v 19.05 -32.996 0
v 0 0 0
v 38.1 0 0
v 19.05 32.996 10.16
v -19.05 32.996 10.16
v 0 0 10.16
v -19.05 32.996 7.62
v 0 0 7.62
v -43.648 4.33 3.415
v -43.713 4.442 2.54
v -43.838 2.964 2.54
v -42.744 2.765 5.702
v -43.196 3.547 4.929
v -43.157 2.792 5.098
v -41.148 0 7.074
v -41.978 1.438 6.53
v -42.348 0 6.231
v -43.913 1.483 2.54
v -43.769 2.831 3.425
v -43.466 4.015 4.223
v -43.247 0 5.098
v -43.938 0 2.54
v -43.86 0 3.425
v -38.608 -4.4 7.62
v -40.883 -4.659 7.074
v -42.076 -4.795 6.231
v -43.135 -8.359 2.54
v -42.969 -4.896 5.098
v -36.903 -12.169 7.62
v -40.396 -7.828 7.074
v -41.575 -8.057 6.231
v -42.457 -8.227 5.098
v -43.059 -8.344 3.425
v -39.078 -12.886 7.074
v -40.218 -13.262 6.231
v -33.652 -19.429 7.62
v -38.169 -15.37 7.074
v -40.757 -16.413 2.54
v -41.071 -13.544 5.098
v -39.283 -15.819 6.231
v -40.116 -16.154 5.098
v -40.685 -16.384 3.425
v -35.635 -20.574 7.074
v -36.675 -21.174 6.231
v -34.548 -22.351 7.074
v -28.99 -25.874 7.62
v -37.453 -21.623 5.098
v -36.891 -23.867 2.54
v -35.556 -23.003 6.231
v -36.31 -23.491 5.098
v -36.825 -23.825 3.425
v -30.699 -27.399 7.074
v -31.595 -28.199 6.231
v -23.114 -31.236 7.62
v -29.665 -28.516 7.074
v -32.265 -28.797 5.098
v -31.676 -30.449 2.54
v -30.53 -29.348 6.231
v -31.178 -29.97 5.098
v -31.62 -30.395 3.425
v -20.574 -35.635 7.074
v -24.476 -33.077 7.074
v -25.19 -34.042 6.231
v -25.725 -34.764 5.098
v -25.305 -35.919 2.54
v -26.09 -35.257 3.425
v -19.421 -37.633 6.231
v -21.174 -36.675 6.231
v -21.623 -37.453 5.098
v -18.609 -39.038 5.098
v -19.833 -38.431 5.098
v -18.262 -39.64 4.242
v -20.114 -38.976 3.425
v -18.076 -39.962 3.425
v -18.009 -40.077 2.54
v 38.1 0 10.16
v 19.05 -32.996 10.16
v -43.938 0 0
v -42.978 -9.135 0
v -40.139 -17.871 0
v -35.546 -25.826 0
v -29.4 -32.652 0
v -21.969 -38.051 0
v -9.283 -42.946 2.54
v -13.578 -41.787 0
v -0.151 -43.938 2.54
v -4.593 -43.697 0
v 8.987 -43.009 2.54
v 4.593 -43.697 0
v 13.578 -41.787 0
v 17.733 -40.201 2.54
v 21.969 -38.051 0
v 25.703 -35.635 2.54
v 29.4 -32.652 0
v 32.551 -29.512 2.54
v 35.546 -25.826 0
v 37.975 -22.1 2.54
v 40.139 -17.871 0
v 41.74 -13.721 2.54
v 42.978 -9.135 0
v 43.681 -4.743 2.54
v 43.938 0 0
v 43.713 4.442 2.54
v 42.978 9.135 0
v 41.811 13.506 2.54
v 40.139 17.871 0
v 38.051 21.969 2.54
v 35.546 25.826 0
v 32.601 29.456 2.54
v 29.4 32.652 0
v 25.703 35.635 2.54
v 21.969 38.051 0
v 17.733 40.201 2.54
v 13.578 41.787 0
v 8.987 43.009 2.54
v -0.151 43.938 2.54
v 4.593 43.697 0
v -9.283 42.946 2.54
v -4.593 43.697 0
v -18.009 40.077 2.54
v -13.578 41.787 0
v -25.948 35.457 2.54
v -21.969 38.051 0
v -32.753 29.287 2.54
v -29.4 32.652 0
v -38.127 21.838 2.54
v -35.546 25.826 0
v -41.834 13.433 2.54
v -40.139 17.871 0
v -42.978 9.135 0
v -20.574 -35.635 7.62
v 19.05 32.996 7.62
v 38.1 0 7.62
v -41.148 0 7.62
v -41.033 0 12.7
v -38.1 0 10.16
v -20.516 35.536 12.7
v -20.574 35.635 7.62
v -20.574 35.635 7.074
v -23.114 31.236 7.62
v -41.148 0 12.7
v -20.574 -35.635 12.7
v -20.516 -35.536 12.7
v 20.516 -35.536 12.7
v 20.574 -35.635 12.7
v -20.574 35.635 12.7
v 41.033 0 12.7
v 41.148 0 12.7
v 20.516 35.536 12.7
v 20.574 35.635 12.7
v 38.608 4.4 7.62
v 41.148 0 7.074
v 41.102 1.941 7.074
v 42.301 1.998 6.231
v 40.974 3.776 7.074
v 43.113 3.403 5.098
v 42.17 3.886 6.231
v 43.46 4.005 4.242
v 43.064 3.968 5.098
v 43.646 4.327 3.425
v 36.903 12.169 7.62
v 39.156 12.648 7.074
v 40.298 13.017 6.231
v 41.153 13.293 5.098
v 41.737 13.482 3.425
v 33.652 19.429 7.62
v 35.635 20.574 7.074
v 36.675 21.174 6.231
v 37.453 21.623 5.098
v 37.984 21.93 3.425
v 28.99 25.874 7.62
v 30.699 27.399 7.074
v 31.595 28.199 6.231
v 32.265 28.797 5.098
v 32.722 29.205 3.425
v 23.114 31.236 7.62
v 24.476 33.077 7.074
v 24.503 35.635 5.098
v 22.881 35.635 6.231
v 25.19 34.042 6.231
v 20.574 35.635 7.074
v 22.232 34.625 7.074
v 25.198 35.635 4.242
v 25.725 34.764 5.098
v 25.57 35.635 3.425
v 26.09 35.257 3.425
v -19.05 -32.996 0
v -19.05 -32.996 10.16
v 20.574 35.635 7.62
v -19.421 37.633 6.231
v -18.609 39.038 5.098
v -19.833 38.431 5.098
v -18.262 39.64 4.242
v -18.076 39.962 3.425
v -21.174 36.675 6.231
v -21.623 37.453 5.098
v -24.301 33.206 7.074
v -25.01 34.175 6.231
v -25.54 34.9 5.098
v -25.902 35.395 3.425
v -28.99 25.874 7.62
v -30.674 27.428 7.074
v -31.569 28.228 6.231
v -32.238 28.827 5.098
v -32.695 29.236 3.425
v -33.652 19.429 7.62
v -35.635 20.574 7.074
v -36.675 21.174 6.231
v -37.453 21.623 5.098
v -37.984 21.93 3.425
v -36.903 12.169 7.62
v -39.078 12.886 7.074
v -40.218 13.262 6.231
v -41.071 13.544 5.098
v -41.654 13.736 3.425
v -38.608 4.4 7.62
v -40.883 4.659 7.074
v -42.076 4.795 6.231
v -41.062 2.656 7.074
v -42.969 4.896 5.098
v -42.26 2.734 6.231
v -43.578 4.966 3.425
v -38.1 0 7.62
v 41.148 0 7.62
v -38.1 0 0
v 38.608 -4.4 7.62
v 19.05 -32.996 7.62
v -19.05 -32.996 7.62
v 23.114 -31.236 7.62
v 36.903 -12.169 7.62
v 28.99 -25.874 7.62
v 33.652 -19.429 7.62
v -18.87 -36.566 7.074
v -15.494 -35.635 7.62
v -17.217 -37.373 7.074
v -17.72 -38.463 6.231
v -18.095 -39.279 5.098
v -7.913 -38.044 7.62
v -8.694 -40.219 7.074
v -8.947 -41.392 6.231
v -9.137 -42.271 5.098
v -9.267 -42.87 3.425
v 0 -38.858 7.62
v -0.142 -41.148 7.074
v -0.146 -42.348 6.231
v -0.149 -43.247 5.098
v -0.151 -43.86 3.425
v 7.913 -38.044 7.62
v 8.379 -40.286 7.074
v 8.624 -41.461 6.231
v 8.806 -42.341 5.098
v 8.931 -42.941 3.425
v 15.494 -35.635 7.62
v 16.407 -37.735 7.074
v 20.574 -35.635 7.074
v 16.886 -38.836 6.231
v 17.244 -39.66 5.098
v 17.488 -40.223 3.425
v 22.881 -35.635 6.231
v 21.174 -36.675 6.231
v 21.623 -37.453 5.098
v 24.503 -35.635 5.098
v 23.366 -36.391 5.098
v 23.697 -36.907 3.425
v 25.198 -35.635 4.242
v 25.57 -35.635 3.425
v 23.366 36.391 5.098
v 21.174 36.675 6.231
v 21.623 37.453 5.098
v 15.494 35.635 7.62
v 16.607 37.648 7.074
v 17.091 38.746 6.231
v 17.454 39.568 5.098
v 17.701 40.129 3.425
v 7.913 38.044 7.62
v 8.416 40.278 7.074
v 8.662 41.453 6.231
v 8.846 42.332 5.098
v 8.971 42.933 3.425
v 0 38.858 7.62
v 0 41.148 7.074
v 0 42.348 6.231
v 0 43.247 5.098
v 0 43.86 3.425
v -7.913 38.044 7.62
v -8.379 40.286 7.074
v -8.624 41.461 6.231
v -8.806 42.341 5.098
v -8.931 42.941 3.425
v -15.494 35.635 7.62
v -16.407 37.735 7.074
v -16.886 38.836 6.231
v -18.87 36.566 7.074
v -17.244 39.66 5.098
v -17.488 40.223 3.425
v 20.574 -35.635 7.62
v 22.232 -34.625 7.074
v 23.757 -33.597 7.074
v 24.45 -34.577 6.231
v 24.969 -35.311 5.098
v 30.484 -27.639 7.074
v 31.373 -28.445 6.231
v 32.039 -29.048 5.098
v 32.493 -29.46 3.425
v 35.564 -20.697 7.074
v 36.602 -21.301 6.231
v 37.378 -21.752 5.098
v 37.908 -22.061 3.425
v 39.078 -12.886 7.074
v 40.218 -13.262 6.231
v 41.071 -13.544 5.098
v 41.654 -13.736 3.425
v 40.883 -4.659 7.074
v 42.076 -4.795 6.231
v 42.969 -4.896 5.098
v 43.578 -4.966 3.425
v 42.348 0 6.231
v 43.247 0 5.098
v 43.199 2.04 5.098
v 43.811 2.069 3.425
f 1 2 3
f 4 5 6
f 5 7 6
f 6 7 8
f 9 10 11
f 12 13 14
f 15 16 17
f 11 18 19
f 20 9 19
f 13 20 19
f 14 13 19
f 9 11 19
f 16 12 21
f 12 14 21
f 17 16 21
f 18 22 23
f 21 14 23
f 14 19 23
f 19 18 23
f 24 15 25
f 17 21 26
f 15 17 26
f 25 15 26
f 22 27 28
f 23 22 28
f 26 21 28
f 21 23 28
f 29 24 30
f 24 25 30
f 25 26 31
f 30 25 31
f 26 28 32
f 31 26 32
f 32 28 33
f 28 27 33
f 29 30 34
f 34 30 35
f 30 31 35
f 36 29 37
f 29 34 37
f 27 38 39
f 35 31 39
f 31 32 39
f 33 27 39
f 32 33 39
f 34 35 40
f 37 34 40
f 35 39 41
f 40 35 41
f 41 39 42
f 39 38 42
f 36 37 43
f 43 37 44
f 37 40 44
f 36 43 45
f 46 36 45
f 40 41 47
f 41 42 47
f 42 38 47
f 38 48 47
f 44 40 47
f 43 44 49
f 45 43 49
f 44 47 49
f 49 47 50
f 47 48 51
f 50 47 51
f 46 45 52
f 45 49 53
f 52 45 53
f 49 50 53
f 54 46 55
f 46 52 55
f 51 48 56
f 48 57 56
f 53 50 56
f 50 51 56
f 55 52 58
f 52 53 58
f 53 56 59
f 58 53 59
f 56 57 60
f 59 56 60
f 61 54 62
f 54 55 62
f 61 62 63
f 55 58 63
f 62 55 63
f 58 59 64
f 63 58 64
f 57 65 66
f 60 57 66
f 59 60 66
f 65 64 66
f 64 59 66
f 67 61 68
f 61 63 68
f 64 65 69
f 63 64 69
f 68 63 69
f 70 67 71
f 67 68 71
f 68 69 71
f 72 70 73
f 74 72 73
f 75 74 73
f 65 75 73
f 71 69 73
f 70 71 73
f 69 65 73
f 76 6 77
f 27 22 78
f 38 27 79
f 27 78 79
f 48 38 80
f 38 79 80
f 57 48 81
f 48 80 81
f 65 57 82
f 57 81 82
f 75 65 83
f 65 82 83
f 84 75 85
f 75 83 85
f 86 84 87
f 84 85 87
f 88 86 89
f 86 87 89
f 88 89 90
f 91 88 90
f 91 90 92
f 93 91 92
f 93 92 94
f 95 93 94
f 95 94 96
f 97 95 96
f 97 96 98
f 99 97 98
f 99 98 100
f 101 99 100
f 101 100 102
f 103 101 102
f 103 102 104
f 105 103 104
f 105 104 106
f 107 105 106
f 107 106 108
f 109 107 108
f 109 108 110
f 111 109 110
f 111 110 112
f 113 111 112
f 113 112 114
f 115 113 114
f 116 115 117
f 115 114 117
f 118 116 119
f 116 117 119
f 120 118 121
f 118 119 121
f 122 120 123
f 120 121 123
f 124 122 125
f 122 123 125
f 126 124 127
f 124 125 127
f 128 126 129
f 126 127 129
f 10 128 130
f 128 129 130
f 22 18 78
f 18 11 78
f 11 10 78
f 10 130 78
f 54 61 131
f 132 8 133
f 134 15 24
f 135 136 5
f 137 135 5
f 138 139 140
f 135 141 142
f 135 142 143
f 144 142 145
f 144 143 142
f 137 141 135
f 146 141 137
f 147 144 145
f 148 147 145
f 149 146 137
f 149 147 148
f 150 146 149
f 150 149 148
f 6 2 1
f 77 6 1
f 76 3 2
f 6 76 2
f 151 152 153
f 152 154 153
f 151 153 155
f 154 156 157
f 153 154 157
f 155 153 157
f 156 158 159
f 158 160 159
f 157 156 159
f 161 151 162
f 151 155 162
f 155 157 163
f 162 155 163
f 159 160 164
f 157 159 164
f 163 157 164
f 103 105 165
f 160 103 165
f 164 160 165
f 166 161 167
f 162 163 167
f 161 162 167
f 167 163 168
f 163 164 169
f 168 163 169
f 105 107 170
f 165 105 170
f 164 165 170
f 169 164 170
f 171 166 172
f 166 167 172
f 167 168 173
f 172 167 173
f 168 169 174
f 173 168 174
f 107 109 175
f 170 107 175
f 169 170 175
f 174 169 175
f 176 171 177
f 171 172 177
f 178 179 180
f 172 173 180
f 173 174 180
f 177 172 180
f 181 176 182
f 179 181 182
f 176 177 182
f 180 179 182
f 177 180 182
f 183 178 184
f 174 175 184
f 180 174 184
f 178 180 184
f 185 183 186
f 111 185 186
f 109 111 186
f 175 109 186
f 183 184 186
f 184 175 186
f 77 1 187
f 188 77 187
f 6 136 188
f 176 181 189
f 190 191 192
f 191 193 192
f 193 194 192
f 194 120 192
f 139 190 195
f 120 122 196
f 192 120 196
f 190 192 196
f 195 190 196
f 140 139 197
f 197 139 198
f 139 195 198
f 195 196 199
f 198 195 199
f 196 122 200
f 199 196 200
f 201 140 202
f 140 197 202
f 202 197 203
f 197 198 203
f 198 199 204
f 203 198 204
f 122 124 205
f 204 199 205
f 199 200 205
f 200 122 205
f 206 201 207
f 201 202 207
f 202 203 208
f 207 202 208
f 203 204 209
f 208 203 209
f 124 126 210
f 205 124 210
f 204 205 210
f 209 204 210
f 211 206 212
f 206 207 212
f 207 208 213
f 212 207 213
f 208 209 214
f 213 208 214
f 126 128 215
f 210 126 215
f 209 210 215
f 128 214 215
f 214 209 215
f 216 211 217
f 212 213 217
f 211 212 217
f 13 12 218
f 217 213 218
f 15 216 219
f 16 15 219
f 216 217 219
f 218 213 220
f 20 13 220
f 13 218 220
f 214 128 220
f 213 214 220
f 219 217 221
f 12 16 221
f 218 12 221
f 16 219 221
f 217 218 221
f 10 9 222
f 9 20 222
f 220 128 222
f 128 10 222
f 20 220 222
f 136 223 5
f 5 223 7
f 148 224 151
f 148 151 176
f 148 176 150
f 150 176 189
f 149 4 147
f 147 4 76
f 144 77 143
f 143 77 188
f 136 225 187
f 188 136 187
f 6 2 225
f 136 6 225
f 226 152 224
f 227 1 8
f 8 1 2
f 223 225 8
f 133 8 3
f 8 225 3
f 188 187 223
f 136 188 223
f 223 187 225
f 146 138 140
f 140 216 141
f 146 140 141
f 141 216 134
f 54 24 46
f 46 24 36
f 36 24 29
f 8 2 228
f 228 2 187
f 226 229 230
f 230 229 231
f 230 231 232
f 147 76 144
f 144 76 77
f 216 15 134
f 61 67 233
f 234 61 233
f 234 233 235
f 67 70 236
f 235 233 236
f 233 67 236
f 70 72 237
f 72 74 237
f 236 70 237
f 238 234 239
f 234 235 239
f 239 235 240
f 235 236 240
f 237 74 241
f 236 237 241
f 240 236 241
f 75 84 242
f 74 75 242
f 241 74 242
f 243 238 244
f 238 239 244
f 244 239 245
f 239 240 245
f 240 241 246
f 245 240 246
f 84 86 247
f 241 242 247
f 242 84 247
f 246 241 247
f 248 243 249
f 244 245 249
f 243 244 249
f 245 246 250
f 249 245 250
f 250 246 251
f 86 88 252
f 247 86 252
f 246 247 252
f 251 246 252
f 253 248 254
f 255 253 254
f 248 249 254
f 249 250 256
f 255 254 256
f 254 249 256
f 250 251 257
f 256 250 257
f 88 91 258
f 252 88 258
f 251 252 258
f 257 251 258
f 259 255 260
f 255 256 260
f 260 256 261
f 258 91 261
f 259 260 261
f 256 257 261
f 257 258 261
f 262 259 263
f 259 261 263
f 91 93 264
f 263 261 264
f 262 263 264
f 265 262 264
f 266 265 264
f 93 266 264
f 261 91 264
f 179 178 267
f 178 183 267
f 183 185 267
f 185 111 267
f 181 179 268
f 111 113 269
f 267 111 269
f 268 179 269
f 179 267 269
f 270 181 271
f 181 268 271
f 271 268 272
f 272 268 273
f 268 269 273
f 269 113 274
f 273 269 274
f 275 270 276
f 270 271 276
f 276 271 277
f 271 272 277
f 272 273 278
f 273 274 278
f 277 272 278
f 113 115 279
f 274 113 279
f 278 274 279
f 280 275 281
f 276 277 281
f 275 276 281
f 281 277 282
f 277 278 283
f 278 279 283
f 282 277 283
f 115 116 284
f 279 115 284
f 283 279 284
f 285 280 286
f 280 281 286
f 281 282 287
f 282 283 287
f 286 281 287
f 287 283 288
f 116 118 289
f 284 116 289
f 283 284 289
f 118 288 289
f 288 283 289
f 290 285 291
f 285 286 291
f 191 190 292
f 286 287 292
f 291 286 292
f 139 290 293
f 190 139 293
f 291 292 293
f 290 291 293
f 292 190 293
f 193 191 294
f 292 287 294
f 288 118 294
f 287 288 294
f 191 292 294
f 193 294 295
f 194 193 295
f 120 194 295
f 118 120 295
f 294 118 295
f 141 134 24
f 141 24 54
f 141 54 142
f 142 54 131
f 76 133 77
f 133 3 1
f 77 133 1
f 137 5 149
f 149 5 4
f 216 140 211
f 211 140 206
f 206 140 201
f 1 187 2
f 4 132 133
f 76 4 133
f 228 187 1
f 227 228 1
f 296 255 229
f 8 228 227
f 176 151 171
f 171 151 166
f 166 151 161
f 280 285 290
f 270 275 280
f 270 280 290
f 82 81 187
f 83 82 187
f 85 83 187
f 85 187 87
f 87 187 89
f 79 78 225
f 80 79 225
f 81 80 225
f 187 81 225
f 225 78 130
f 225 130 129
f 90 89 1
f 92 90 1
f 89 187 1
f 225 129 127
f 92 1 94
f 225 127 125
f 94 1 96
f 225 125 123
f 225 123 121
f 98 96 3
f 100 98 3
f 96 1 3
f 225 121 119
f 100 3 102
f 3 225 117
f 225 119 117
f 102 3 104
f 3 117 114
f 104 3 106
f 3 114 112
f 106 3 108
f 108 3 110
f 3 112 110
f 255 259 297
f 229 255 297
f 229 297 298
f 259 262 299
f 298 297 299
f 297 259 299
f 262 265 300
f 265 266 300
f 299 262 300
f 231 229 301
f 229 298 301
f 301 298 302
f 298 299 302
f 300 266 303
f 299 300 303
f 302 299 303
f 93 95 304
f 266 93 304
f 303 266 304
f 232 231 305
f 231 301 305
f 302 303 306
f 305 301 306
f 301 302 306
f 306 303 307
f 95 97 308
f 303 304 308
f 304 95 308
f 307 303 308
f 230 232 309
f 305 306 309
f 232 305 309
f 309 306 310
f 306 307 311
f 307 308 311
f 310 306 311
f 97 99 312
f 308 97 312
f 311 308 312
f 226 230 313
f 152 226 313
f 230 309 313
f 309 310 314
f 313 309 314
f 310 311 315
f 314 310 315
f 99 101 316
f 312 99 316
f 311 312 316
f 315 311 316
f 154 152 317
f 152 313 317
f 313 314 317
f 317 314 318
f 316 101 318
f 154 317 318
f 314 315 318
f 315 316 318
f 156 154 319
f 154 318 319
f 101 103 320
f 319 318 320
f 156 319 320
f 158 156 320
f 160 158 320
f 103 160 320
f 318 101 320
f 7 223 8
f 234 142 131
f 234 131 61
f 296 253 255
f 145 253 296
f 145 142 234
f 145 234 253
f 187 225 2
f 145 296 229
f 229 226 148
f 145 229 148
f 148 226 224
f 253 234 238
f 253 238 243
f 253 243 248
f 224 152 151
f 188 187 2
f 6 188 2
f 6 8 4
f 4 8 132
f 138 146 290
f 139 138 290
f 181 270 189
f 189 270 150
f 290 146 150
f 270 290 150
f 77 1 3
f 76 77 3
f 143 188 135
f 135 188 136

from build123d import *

# Parameters (mm, degrees)
F1_DEPTH = 12.7
F2_DEPTH = 10.16
F3_DEPTH = 7.62
F4_DEPTH = 7.62
F5_DEPTH = 10.16
F6_DEPTH = 7.62
F7_DEPTH = 10.16
F8_DEPTH = 7.62
F10_SIZE = 2.54
F11_SIZE = 2.53999
F12_SIZE = 2.53999


# Not quite as in the source:
# - a fillet or chamfer that OpenCascade refuses, or shapes differently, is made with other operations: its cross-section is extruded or revolved along the edge and cut away or added
# - a fillet or chamfer is up to 0.001 mm smaller than in the source, because OpenCascade refuses the exact size


with BuildPart() as f1:
    # F0 (on Top) → F1 (new body)
    with BuildSketch(Plane.XY):
        Polygon((-20.574, 35.6352133149), (-41.148, 0), (-20.574, -35.6352133149), (20.574, -35.6352133149), (41.148, 0), (20.574, 35.6352133149), align=None)
        Polygon((38.1, 0), (19.05, -32.9955678842), (-19.05, -32.9955678842), (-38.1, 0), (-19.05, 32.9955678842), (19.05, 32.9955678842), align=None, mode=Mode.SUBTRACT)
    extrude(amount=F1_DEPTH)

    # F0 (on Top) → F2 (join)
    with BuildSketch(Plane.XY):
        Polygon((-19.05, 32.9955678842), (0, 0), (19.05, 32.9955678842), align=None)
    extrude(amount=F2_DEPTH)

    # F0 (on Top) → F3 (join)
    with BuildSketch(Plane.XY):
        Polygon((-38.1, 0), (0, 0), (-19.05, 32.9955678842), align=None)
    extrude(amount=F3_DEPTH)

    # F0 (on Top) → F4 (join)
    with BuildSketch(Plane.XY):
        Polygon((0, 0), (38.1, 0), (19.05, 32.9955678842), align=None)
    extrude(amount=F4_DEPTH)

    # F0 (on Top) → F8 (join)
    with BuildSketch(Plane.XY):
        with BuildLine():
            ThreePointArc((43.9377985476, 0), (0, 43.9377985476), (-43.9377985476, 0))
            ThreePointArc((-43.9377985476, 0), (0, -43.9377985476), (43.9377985476, 0))
        make_face()
        with BuildLine():
            ThreePointArc((-20.574, -35.6352133149), (-35.6352133149, -20.574), (-41.148, 0))
            ThreePointArc((-41.148, 0), (-35.6352133149, 20.574), (-20.574, 35.6352133149))
            ThreePointArc((-20.574, 35.6352133149), (-10.6498860679, 39.7459159001), (0, 41.148))
            ThreePointArc((0, 41.148), (10.6498860679, 39.7459159001), (20.574, 35.6352133149))
            ThreePointArc((20.574, 35.6352133149), (35.6352133149, 20.574), (41.148, 0))
            ThreePointArc((41.148, 0), (35.6352133149, -20.574), (20.574, -35.6352133149))
            ThreePointArc((20.574, -35.6352133149), (0, -41.148), (-20.574, -35.6352133149))
        make_face(mode=Mode.SUBTRACT)
        with BuildLine():
            Line((-20.574, -35.6352133149), (-41.148, 0))
            ThreePointArc((-41.148, 0), (-35.6352133149, -20.574), (-20.574, -35.6352133149))
        make_face()
        with BuildLine():
            Line((20.574, -35.6352133149), (-20.574, -35.6352133149))
            ThreePointArc((-20.574, -35.6352133149), (0, -41.148), (20.574, -35.6352133149))
        make_face()
        with BuildLine():
            Line((41.148, 0), (20.574, -35.6352133149))
            ThreePointArc((20.574, -35.6352133149), (35.6352133149, -20.574), (41.148, 0))
        make_face()
        with BuildLine():
            ThreePointArc((41.148, 0), (35.6352133149, 20.574), (20.574, 35.6352133149))
            Line((20.574, 35.6352133149), (41.148, 0))
        make_face()
        with BuildLine():
            ThreePointArc((0, 41.148), (-10.6498860679, 39.7459159001), (-20.574, 35.6352133149))
            Line((-20.574, 35.6352133149), (20.574, 35.6352133149))
            ThreePointArc((20.574, 35.6352133149), (10.6498860679, 39.7459159001), (0, 41.148))
        make_face()
        with BuildLine():
            ThreePointArc((-20.574, 35.6352133149), (-35.6352133149, 20.574), (-41.148, 0))
            Line((-41.148, 0), (-20.574, 35.6352133149))
        make_face()
    extrude(amount=F8_DEPTH)

    # F9: fillet of radius 5.08 on 1 edges, made by hand


with BuildPart() as f5:
    # F0 (on Top) → F5 (new body)
    with BuildSketch(Plane.XY):
        Polygon((0, 0), (19.05, -32.9955678842), (38.1, 0), align=None)
    extrude(amount=F5_DEPTH)


with BuildPart() as f6:
    # F0 (on Top) → F6 (new body)
    with BuildSketch(Plane.XY):
        Polygon((-19.05, -32.9955678842), (19.05, -32.9955678842), (0, 0), align=None)
    extrude(amount=F6_DEPTH)


with BuildPart() as f7:
    # F0 (on Top) → F7 (new body)
    with BuildSketch(Plane.XY):
        Polygon((-38.1, 0), (-19.05, -32.9955678842), (0, 0), align=None)
    extrude(amount=F7_DEPTH)


with BuildPart() as f9_tool2:
    # F9_s3 → F9_t4 (revolve)
    with BuildSketch(Plane.XZ):
        with BuildLine():
            ThreePointArc((-38.8577985476, 7.62), (-42.449900996, 6.1321024484), (-43.9377985476, 2.54))
            Line((-43.9377985476, 2.54), (-43.9377985476, 7.62))
            Line((-43.9377985476, 7.62), (-38.8577985476, 7.62))
        make_face()
    revolve(axis=Axis((0, 0, 7.62), (0, 0, 1)))

    split(bisect_by=Plane(origin=(-30.861, -17.8176066575, 0), x_dir=(0, 0, 1), z_dir=(-0.8660254038, -0.5, 0)), keep=Keep.TOP)


with BuildPart() as f1_1:
    add(f1.part)

    # F9_t1: cut F9_tool2
    add(f9_tool2.part, mode=Mode.SUBTRACT)


with BuildPart() as f9_tool7:
    # F9_s8 → F9_t9 (revolve)
    with BuildSketch(Plane.XZ):
        with BuildLine():
            ThreePointArc((-38.8577985476, 7.62), (-42.449900996, 6.1321024484), (-43.9377985476, 2.54))
            Line((-43.9377985476, 2.54), (-43.9377985476, 7.62))
            Line((-43.9377985476, 7.62), (-38.8577985476, 7.62))
        make_face()
    revolve(axis=Axis((0, 0, 7.62), (0, 0, 1)))

    split(bisect_by=Plane(origin=(-30.861, 17.8176066575, 0), x_dir=(0, 0, 1), z_dir=(-0.8660254038, 0.5, 0)), keep=Keep.TOP)


with BuildPart() as f1_2:
    add(f1_1.part)

    # F9_t6: cut F9_tool7
    add(f9_tool7.part, mode=Mode.SUBTRACT)


with BuildPart() as f9_tool12:
    # F9_s13 → F9_t14 (revolve)
    with BuildSketch(Plane.XZ):
        with BuildLine():
            ThreePointArc((-38.8577985476, 7.62), (-42.449900996, 6.1321024484), (-43.9377985476, 2.54))
            Line((-43.9377985476, 2.54), (-43.9377985476, 7.62))
            Line((-43.9377985476, 7.62), (-38.8577985476, 7.62))
        make_face()
    revolve(axis=Axis((0, 0, 7.62), (0, 0, 1)))

    split(bisect_by=Plane.XZ.offset(35.6352133149), keep=Keep.TOP)


with BuildPart() as f1_3:
    add(f1_2.part)

    # F9_t11: cut F9_tool12
    add(f9_tool12.part, mode=Mode.SUBTRACT)


with BuildPart() as f9_tool17:
    # F9_s18 → F9_t19 (revolve)
    with BuildSketch(Plane.XZ):
        with BuildLine():
            ThreePointArc((-38.8577985476, 7.62), (-42.449900996, 6.1321024484), (-43.9377985476, 2.54))
            Line((-43.9377985476, 2.54), (-43.9377985476, 7.62))
            Line((-43.9377985476, 7.62), (-38.8577985476, 7.62))
        make_face()
    revolve(axis=Axis((0, 0, 7.62), (0, 0, 1)))

    split(bisect_by=Plane.XZ.offset(-35.6352133149), keep=Keep.BOTTOM)


with BuildPart() as f1_4:
    add(f1_3.part)

    # F9_t16: cut F9_tool17
    add(f9_tool17.part, mode=Mode.SUBTRACT)


with BuildPart() as f9_tool22:
    # F9_s23 → F9_t24 (revolve)
    with BuildSketch(Plane.XZ):
        with BuildLine():
            ThreePointArc((-38.8577985476, 7.62), (-42.449900996, 6.1321024484), (-43.9377985476, 2.54))
            Line((-43.9377985476, 2.54), (-43.9377985476, 7.62))
            Line((-43.9377985476, 7.62), (-38.8577985476, 7.62))
        make_face()
    revolve(axis=Axis((0, 0, 7.62), (0, 0, 1)))

    split(bisect_by=Plane(origin=(30.861, -17.8176066575, 0), x_dir=(0, 0, 1), z_dir=(0.8660254038, -0.5, 0)), keep=Keep.TOP)


with BuildPart() as f1_5:
    add(f1_4.part)

    # F9_t21: cut F9_tool22
    add(f9_tool22.part, mode=Mode.SUBTRACT)


with BuildPart() as f9_tool27:
    # F9_s28 → F9_t29 (revolve)
    with BuildSketch(Plane.XZ):
        with BuildLine():
            ThreePointArc((-38.8577985476, 7.62), (-42.449900996, 6.1321024484), (-43.9377985476, 2.54))
            Line((-43.9377985476, 2.54), (-43.9377985476, 7.62))
            Line((-43.9377985476, 7.62), (-38.8577985476, 7.62))
        make_face()
    revolve(axis=Axis((0, 0, 7.62), (0, 0, 1)))

    split(bisect_by=Plane(origin=(30.861, 17.8176066575, 0), x_dir=(0, 0, 1), z_dir=(0.8660254038, 0.5, 0)), keep=Keep.TOP)


with BuildPart() as f1_6:
    add(f1_5.part)

    # F9_t26: cut F9_tool27
    add(f9_tool27.part, mode=Mode.SUBTRACT)

    # F10
    f10_edges = [f1_6.edges().sort_by_distance(p)[0] for p in [
        (-28.575, 16.497784, 12.7),
        (28.575, -16.497784, 12.7),
        (0, -32.995568, 12.7),
        (-28.575, -16.497784, 12.7),
    ]]
    chamfer(f10_edges, length=F10_SIZE)

    # F11 (size 2.54 in the source; OpenCascade refuses exactly that, so slightly less here)
    f11_edges = [f1_6.edges().sort_by_distance(p)[0] for p in [
        (0, 32.995568, 12.7),
    ]]
    chamfer(f11_edges, length=F11_SIZE)

    # F12 (size 2.54 in the source; OpenCascade refuses exactly that, so slightly less here)
    f12_edges = [f1_6.edges().sort_by_distance(p)[0] for p in [
        (28.575, 16.497784, 12.7),
    ]]
    chamfer(f12_edges, length=F12_SIZE)


solid = Compound([f5.part, f6.part, f7.part, f1_6.part])
